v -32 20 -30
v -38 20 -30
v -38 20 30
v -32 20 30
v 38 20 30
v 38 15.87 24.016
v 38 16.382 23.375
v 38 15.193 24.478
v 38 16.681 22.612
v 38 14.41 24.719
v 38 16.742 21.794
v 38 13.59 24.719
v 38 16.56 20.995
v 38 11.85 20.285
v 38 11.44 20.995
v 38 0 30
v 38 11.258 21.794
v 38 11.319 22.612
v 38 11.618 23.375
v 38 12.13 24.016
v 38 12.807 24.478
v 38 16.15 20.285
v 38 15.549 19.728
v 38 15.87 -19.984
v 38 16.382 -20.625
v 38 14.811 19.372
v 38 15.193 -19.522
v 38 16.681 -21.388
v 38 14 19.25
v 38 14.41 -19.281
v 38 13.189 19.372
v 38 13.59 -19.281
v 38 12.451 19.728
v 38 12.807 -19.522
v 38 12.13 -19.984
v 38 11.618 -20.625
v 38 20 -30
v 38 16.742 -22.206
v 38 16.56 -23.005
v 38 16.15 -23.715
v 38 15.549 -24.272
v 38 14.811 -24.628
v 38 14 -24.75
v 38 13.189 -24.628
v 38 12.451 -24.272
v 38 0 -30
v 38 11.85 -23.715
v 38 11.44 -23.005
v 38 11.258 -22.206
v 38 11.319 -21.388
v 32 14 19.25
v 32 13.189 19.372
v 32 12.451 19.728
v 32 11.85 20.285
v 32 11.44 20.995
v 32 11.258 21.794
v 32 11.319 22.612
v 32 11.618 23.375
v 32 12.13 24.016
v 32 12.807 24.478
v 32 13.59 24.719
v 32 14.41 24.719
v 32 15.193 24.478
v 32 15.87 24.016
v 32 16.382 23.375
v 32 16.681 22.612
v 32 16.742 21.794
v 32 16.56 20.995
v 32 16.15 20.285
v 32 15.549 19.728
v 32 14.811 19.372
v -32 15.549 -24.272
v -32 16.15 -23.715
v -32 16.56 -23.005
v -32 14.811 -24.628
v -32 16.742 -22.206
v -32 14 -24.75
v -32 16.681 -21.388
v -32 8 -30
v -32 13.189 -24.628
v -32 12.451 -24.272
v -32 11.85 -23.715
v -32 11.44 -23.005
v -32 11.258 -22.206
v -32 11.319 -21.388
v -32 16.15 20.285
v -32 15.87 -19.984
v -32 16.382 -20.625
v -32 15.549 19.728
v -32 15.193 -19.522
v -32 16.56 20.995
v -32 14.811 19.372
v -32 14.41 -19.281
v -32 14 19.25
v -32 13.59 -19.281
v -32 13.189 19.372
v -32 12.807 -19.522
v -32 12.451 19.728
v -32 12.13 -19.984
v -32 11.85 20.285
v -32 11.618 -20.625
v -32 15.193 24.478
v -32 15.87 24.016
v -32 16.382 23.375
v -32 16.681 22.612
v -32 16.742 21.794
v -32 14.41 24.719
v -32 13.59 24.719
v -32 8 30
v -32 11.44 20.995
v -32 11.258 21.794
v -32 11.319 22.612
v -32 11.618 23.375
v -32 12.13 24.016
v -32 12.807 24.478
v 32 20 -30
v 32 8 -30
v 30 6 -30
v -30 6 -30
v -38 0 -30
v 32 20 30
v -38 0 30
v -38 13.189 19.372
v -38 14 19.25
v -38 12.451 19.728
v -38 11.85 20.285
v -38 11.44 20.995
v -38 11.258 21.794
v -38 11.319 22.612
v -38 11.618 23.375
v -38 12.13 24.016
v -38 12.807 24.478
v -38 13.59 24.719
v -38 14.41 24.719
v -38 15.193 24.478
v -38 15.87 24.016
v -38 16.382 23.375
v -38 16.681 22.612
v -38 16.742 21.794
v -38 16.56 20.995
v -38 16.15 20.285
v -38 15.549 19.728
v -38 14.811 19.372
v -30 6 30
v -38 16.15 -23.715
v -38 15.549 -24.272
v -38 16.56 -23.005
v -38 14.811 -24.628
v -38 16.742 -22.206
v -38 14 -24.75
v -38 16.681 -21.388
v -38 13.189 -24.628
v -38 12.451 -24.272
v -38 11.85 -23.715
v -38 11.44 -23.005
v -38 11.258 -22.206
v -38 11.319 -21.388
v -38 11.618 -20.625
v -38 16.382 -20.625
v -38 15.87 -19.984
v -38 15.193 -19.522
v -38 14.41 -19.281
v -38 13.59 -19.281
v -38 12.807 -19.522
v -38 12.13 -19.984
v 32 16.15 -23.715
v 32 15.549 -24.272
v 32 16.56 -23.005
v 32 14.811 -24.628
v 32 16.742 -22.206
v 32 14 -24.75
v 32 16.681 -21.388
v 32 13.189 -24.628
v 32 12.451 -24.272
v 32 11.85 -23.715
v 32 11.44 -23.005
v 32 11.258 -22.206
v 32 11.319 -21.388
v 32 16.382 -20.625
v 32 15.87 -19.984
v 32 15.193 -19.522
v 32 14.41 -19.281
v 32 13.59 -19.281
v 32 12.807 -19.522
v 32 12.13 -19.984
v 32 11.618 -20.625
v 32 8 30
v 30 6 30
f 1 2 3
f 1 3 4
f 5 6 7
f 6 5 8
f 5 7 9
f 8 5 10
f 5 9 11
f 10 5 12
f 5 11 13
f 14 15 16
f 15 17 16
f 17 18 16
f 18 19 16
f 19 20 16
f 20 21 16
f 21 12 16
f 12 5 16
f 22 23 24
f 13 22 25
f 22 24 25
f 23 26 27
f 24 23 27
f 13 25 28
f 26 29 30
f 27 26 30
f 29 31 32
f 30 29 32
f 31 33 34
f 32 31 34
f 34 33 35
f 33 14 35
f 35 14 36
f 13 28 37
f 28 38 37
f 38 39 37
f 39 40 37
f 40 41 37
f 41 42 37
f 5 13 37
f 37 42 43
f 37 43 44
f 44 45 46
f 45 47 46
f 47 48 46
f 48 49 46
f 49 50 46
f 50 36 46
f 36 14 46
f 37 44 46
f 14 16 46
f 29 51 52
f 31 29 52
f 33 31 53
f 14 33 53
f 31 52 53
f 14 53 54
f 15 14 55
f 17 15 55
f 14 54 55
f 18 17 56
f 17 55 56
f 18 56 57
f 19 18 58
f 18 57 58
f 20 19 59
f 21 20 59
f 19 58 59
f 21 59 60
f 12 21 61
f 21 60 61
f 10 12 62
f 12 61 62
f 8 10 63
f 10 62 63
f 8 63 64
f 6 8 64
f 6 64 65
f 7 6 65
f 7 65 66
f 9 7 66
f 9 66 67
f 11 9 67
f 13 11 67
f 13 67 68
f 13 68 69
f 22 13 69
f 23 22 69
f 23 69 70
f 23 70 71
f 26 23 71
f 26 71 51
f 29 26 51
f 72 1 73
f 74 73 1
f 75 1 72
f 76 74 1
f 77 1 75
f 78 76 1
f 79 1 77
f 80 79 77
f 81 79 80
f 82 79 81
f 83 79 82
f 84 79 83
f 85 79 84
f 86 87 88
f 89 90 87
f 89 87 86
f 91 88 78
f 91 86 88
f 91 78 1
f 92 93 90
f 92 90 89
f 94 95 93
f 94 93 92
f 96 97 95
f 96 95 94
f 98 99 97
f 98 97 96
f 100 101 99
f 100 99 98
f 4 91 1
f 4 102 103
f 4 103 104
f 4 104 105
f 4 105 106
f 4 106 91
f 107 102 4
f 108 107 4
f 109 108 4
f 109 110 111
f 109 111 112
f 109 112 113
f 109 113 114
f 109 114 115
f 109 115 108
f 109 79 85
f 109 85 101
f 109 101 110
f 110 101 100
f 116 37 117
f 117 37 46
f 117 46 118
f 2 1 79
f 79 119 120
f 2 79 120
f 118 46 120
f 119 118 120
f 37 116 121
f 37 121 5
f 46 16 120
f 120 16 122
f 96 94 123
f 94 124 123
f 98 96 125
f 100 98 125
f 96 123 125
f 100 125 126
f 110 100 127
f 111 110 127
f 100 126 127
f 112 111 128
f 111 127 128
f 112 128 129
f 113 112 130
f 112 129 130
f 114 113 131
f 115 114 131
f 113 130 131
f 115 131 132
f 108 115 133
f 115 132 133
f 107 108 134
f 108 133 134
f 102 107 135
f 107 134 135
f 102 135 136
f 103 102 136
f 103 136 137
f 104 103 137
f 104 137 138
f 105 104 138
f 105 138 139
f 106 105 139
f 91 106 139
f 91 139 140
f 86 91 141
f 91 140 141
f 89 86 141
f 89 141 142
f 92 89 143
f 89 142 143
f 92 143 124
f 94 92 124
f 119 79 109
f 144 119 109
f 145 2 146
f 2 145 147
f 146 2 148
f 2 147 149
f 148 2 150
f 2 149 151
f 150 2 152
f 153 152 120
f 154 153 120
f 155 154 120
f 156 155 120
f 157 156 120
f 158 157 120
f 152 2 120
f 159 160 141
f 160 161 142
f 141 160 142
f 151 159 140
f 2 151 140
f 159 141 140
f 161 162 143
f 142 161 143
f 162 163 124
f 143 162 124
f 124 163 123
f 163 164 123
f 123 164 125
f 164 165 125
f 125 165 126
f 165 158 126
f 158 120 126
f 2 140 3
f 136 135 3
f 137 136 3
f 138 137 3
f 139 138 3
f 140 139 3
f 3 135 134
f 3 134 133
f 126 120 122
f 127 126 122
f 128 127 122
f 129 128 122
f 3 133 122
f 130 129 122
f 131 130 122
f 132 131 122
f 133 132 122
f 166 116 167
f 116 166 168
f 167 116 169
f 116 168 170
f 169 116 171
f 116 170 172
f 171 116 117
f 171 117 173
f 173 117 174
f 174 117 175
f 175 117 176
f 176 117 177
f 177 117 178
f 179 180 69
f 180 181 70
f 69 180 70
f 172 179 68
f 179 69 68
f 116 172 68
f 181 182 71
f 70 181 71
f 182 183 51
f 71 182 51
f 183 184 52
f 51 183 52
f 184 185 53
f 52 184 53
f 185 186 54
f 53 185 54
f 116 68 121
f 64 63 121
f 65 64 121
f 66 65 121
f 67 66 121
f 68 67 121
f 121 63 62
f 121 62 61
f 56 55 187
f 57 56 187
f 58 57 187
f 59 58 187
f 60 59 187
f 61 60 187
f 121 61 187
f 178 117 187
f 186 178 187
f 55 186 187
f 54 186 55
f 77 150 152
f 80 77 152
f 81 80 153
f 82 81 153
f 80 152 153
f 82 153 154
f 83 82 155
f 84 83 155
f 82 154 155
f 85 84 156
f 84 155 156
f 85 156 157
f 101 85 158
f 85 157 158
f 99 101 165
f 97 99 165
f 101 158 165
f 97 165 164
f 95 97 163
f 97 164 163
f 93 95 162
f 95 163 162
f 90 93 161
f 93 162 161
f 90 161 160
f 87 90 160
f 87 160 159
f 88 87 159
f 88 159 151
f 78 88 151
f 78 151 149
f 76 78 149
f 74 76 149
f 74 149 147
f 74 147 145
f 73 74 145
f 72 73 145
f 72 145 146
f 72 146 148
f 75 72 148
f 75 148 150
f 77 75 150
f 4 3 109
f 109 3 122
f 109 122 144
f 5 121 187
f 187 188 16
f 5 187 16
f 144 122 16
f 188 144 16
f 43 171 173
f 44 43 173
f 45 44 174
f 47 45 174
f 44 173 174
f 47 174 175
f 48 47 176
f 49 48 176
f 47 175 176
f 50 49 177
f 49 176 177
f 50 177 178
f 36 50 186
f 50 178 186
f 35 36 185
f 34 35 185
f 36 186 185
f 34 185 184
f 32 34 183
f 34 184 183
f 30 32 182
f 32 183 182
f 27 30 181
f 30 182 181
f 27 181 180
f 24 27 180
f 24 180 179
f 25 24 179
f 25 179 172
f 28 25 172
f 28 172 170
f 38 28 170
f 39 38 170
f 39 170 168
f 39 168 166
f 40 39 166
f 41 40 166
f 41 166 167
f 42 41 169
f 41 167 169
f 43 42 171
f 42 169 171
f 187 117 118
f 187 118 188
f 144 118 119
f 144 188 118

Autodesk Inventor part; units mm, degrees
ref_plane "YZ Plane" through (0, 0, 0) normal (1, 0, 0) x (0, 1, 0)
ref_plane "XZ Plane" through (0, 0, 0) normal (0, 1, 0) x (-1, 0, 0)
ref_plane "XY Plane" through (0, 0, 0) normal (0, 0, 1) x (1, 0, 0)
sketch "Esquisse1" plane through (0, 0, 0) normal (0, 1, 0) x (-1, 0, 0)
  line L0 (38, 30) -> (-38, 30)
  line L1 (-38, 30) -> (-38, -30)
  line L2 (-38, -30) -> (38, -30)
  line L3 (38, -30) -> (38, 30)
  line L4 (38, 30) -> (-38, -30) construction
  line L5 (-38, 30) -> (38, -30) construction
  point P0 (0, 0)
  dimension "d0" = 76
  dimension "d1" = 60
extrude "Extrusion1" add sketch "Esquisse1" along normal blind 6
sketch "Esquisse2" plane through (0, 6, 0) normal (0, 1, 0) x (1, 0, 0)
  line L0 (38, 30) -> (-38, 30) projected
  line L1 (-38, -30) -> (38, -30) projected
  line L2 (-38, 30) -> (-32, 30)
  line L3 (-32, 30) -> (-32, -30)
  line L4 (-32, -30) -> (-38, -30)
  line L5 (-38, -30) -> (-38, 30)
  line L6 (38, 30) -> (32, 30)
  line L7 (32, 30) -> (32, -30)
  line L8 (32, -30) -> (38, -30)
  line L9 (38, -30) -> (38, 30)
  point P0 (0, 0)
  dimension "d4" = 6
  dimension "d5" = 6
extrude "Extrusion2" add sketch "Esquisse2" along normal blind 14 contours L9 L1 L7 L0 | L3 L1 L5 L0
chamfer "Chanfrein1" distance 2 angle 45 2 edges at (-32, 6, 0) (32, 6, 0)
sketch "Esquisse4" plane through (38, 0, 30) normal (1, 0, 0) x (0, 0, -1)
  line L0 (0, 20) -> (60, 20) projected
  line L1 (60, 0) -> (60, 20) projected
  line L2 (0, 0) -> (0, 20) projected
  line L3 (0, 0) -> (60, 0) projected
  point P0 (30, 0)
  point P1 (52, 14)
  point P2 (8, 14)
  dimension "d11" = 6
  dimension "d12" = 8
  dimension "d13" = 8
  dimension "d21" = 14
hole "Perçage1" at (38, 14, -22) at (38, 14, 22) direction (-1, 0, 0) diameter 5.5 end through all clearance for "Vis d'assemblage à tête hexagonale ISO 24017" size "M5" standard "ISO"
equation "\"d13\" = d12"
properties part number "base_cloison"
